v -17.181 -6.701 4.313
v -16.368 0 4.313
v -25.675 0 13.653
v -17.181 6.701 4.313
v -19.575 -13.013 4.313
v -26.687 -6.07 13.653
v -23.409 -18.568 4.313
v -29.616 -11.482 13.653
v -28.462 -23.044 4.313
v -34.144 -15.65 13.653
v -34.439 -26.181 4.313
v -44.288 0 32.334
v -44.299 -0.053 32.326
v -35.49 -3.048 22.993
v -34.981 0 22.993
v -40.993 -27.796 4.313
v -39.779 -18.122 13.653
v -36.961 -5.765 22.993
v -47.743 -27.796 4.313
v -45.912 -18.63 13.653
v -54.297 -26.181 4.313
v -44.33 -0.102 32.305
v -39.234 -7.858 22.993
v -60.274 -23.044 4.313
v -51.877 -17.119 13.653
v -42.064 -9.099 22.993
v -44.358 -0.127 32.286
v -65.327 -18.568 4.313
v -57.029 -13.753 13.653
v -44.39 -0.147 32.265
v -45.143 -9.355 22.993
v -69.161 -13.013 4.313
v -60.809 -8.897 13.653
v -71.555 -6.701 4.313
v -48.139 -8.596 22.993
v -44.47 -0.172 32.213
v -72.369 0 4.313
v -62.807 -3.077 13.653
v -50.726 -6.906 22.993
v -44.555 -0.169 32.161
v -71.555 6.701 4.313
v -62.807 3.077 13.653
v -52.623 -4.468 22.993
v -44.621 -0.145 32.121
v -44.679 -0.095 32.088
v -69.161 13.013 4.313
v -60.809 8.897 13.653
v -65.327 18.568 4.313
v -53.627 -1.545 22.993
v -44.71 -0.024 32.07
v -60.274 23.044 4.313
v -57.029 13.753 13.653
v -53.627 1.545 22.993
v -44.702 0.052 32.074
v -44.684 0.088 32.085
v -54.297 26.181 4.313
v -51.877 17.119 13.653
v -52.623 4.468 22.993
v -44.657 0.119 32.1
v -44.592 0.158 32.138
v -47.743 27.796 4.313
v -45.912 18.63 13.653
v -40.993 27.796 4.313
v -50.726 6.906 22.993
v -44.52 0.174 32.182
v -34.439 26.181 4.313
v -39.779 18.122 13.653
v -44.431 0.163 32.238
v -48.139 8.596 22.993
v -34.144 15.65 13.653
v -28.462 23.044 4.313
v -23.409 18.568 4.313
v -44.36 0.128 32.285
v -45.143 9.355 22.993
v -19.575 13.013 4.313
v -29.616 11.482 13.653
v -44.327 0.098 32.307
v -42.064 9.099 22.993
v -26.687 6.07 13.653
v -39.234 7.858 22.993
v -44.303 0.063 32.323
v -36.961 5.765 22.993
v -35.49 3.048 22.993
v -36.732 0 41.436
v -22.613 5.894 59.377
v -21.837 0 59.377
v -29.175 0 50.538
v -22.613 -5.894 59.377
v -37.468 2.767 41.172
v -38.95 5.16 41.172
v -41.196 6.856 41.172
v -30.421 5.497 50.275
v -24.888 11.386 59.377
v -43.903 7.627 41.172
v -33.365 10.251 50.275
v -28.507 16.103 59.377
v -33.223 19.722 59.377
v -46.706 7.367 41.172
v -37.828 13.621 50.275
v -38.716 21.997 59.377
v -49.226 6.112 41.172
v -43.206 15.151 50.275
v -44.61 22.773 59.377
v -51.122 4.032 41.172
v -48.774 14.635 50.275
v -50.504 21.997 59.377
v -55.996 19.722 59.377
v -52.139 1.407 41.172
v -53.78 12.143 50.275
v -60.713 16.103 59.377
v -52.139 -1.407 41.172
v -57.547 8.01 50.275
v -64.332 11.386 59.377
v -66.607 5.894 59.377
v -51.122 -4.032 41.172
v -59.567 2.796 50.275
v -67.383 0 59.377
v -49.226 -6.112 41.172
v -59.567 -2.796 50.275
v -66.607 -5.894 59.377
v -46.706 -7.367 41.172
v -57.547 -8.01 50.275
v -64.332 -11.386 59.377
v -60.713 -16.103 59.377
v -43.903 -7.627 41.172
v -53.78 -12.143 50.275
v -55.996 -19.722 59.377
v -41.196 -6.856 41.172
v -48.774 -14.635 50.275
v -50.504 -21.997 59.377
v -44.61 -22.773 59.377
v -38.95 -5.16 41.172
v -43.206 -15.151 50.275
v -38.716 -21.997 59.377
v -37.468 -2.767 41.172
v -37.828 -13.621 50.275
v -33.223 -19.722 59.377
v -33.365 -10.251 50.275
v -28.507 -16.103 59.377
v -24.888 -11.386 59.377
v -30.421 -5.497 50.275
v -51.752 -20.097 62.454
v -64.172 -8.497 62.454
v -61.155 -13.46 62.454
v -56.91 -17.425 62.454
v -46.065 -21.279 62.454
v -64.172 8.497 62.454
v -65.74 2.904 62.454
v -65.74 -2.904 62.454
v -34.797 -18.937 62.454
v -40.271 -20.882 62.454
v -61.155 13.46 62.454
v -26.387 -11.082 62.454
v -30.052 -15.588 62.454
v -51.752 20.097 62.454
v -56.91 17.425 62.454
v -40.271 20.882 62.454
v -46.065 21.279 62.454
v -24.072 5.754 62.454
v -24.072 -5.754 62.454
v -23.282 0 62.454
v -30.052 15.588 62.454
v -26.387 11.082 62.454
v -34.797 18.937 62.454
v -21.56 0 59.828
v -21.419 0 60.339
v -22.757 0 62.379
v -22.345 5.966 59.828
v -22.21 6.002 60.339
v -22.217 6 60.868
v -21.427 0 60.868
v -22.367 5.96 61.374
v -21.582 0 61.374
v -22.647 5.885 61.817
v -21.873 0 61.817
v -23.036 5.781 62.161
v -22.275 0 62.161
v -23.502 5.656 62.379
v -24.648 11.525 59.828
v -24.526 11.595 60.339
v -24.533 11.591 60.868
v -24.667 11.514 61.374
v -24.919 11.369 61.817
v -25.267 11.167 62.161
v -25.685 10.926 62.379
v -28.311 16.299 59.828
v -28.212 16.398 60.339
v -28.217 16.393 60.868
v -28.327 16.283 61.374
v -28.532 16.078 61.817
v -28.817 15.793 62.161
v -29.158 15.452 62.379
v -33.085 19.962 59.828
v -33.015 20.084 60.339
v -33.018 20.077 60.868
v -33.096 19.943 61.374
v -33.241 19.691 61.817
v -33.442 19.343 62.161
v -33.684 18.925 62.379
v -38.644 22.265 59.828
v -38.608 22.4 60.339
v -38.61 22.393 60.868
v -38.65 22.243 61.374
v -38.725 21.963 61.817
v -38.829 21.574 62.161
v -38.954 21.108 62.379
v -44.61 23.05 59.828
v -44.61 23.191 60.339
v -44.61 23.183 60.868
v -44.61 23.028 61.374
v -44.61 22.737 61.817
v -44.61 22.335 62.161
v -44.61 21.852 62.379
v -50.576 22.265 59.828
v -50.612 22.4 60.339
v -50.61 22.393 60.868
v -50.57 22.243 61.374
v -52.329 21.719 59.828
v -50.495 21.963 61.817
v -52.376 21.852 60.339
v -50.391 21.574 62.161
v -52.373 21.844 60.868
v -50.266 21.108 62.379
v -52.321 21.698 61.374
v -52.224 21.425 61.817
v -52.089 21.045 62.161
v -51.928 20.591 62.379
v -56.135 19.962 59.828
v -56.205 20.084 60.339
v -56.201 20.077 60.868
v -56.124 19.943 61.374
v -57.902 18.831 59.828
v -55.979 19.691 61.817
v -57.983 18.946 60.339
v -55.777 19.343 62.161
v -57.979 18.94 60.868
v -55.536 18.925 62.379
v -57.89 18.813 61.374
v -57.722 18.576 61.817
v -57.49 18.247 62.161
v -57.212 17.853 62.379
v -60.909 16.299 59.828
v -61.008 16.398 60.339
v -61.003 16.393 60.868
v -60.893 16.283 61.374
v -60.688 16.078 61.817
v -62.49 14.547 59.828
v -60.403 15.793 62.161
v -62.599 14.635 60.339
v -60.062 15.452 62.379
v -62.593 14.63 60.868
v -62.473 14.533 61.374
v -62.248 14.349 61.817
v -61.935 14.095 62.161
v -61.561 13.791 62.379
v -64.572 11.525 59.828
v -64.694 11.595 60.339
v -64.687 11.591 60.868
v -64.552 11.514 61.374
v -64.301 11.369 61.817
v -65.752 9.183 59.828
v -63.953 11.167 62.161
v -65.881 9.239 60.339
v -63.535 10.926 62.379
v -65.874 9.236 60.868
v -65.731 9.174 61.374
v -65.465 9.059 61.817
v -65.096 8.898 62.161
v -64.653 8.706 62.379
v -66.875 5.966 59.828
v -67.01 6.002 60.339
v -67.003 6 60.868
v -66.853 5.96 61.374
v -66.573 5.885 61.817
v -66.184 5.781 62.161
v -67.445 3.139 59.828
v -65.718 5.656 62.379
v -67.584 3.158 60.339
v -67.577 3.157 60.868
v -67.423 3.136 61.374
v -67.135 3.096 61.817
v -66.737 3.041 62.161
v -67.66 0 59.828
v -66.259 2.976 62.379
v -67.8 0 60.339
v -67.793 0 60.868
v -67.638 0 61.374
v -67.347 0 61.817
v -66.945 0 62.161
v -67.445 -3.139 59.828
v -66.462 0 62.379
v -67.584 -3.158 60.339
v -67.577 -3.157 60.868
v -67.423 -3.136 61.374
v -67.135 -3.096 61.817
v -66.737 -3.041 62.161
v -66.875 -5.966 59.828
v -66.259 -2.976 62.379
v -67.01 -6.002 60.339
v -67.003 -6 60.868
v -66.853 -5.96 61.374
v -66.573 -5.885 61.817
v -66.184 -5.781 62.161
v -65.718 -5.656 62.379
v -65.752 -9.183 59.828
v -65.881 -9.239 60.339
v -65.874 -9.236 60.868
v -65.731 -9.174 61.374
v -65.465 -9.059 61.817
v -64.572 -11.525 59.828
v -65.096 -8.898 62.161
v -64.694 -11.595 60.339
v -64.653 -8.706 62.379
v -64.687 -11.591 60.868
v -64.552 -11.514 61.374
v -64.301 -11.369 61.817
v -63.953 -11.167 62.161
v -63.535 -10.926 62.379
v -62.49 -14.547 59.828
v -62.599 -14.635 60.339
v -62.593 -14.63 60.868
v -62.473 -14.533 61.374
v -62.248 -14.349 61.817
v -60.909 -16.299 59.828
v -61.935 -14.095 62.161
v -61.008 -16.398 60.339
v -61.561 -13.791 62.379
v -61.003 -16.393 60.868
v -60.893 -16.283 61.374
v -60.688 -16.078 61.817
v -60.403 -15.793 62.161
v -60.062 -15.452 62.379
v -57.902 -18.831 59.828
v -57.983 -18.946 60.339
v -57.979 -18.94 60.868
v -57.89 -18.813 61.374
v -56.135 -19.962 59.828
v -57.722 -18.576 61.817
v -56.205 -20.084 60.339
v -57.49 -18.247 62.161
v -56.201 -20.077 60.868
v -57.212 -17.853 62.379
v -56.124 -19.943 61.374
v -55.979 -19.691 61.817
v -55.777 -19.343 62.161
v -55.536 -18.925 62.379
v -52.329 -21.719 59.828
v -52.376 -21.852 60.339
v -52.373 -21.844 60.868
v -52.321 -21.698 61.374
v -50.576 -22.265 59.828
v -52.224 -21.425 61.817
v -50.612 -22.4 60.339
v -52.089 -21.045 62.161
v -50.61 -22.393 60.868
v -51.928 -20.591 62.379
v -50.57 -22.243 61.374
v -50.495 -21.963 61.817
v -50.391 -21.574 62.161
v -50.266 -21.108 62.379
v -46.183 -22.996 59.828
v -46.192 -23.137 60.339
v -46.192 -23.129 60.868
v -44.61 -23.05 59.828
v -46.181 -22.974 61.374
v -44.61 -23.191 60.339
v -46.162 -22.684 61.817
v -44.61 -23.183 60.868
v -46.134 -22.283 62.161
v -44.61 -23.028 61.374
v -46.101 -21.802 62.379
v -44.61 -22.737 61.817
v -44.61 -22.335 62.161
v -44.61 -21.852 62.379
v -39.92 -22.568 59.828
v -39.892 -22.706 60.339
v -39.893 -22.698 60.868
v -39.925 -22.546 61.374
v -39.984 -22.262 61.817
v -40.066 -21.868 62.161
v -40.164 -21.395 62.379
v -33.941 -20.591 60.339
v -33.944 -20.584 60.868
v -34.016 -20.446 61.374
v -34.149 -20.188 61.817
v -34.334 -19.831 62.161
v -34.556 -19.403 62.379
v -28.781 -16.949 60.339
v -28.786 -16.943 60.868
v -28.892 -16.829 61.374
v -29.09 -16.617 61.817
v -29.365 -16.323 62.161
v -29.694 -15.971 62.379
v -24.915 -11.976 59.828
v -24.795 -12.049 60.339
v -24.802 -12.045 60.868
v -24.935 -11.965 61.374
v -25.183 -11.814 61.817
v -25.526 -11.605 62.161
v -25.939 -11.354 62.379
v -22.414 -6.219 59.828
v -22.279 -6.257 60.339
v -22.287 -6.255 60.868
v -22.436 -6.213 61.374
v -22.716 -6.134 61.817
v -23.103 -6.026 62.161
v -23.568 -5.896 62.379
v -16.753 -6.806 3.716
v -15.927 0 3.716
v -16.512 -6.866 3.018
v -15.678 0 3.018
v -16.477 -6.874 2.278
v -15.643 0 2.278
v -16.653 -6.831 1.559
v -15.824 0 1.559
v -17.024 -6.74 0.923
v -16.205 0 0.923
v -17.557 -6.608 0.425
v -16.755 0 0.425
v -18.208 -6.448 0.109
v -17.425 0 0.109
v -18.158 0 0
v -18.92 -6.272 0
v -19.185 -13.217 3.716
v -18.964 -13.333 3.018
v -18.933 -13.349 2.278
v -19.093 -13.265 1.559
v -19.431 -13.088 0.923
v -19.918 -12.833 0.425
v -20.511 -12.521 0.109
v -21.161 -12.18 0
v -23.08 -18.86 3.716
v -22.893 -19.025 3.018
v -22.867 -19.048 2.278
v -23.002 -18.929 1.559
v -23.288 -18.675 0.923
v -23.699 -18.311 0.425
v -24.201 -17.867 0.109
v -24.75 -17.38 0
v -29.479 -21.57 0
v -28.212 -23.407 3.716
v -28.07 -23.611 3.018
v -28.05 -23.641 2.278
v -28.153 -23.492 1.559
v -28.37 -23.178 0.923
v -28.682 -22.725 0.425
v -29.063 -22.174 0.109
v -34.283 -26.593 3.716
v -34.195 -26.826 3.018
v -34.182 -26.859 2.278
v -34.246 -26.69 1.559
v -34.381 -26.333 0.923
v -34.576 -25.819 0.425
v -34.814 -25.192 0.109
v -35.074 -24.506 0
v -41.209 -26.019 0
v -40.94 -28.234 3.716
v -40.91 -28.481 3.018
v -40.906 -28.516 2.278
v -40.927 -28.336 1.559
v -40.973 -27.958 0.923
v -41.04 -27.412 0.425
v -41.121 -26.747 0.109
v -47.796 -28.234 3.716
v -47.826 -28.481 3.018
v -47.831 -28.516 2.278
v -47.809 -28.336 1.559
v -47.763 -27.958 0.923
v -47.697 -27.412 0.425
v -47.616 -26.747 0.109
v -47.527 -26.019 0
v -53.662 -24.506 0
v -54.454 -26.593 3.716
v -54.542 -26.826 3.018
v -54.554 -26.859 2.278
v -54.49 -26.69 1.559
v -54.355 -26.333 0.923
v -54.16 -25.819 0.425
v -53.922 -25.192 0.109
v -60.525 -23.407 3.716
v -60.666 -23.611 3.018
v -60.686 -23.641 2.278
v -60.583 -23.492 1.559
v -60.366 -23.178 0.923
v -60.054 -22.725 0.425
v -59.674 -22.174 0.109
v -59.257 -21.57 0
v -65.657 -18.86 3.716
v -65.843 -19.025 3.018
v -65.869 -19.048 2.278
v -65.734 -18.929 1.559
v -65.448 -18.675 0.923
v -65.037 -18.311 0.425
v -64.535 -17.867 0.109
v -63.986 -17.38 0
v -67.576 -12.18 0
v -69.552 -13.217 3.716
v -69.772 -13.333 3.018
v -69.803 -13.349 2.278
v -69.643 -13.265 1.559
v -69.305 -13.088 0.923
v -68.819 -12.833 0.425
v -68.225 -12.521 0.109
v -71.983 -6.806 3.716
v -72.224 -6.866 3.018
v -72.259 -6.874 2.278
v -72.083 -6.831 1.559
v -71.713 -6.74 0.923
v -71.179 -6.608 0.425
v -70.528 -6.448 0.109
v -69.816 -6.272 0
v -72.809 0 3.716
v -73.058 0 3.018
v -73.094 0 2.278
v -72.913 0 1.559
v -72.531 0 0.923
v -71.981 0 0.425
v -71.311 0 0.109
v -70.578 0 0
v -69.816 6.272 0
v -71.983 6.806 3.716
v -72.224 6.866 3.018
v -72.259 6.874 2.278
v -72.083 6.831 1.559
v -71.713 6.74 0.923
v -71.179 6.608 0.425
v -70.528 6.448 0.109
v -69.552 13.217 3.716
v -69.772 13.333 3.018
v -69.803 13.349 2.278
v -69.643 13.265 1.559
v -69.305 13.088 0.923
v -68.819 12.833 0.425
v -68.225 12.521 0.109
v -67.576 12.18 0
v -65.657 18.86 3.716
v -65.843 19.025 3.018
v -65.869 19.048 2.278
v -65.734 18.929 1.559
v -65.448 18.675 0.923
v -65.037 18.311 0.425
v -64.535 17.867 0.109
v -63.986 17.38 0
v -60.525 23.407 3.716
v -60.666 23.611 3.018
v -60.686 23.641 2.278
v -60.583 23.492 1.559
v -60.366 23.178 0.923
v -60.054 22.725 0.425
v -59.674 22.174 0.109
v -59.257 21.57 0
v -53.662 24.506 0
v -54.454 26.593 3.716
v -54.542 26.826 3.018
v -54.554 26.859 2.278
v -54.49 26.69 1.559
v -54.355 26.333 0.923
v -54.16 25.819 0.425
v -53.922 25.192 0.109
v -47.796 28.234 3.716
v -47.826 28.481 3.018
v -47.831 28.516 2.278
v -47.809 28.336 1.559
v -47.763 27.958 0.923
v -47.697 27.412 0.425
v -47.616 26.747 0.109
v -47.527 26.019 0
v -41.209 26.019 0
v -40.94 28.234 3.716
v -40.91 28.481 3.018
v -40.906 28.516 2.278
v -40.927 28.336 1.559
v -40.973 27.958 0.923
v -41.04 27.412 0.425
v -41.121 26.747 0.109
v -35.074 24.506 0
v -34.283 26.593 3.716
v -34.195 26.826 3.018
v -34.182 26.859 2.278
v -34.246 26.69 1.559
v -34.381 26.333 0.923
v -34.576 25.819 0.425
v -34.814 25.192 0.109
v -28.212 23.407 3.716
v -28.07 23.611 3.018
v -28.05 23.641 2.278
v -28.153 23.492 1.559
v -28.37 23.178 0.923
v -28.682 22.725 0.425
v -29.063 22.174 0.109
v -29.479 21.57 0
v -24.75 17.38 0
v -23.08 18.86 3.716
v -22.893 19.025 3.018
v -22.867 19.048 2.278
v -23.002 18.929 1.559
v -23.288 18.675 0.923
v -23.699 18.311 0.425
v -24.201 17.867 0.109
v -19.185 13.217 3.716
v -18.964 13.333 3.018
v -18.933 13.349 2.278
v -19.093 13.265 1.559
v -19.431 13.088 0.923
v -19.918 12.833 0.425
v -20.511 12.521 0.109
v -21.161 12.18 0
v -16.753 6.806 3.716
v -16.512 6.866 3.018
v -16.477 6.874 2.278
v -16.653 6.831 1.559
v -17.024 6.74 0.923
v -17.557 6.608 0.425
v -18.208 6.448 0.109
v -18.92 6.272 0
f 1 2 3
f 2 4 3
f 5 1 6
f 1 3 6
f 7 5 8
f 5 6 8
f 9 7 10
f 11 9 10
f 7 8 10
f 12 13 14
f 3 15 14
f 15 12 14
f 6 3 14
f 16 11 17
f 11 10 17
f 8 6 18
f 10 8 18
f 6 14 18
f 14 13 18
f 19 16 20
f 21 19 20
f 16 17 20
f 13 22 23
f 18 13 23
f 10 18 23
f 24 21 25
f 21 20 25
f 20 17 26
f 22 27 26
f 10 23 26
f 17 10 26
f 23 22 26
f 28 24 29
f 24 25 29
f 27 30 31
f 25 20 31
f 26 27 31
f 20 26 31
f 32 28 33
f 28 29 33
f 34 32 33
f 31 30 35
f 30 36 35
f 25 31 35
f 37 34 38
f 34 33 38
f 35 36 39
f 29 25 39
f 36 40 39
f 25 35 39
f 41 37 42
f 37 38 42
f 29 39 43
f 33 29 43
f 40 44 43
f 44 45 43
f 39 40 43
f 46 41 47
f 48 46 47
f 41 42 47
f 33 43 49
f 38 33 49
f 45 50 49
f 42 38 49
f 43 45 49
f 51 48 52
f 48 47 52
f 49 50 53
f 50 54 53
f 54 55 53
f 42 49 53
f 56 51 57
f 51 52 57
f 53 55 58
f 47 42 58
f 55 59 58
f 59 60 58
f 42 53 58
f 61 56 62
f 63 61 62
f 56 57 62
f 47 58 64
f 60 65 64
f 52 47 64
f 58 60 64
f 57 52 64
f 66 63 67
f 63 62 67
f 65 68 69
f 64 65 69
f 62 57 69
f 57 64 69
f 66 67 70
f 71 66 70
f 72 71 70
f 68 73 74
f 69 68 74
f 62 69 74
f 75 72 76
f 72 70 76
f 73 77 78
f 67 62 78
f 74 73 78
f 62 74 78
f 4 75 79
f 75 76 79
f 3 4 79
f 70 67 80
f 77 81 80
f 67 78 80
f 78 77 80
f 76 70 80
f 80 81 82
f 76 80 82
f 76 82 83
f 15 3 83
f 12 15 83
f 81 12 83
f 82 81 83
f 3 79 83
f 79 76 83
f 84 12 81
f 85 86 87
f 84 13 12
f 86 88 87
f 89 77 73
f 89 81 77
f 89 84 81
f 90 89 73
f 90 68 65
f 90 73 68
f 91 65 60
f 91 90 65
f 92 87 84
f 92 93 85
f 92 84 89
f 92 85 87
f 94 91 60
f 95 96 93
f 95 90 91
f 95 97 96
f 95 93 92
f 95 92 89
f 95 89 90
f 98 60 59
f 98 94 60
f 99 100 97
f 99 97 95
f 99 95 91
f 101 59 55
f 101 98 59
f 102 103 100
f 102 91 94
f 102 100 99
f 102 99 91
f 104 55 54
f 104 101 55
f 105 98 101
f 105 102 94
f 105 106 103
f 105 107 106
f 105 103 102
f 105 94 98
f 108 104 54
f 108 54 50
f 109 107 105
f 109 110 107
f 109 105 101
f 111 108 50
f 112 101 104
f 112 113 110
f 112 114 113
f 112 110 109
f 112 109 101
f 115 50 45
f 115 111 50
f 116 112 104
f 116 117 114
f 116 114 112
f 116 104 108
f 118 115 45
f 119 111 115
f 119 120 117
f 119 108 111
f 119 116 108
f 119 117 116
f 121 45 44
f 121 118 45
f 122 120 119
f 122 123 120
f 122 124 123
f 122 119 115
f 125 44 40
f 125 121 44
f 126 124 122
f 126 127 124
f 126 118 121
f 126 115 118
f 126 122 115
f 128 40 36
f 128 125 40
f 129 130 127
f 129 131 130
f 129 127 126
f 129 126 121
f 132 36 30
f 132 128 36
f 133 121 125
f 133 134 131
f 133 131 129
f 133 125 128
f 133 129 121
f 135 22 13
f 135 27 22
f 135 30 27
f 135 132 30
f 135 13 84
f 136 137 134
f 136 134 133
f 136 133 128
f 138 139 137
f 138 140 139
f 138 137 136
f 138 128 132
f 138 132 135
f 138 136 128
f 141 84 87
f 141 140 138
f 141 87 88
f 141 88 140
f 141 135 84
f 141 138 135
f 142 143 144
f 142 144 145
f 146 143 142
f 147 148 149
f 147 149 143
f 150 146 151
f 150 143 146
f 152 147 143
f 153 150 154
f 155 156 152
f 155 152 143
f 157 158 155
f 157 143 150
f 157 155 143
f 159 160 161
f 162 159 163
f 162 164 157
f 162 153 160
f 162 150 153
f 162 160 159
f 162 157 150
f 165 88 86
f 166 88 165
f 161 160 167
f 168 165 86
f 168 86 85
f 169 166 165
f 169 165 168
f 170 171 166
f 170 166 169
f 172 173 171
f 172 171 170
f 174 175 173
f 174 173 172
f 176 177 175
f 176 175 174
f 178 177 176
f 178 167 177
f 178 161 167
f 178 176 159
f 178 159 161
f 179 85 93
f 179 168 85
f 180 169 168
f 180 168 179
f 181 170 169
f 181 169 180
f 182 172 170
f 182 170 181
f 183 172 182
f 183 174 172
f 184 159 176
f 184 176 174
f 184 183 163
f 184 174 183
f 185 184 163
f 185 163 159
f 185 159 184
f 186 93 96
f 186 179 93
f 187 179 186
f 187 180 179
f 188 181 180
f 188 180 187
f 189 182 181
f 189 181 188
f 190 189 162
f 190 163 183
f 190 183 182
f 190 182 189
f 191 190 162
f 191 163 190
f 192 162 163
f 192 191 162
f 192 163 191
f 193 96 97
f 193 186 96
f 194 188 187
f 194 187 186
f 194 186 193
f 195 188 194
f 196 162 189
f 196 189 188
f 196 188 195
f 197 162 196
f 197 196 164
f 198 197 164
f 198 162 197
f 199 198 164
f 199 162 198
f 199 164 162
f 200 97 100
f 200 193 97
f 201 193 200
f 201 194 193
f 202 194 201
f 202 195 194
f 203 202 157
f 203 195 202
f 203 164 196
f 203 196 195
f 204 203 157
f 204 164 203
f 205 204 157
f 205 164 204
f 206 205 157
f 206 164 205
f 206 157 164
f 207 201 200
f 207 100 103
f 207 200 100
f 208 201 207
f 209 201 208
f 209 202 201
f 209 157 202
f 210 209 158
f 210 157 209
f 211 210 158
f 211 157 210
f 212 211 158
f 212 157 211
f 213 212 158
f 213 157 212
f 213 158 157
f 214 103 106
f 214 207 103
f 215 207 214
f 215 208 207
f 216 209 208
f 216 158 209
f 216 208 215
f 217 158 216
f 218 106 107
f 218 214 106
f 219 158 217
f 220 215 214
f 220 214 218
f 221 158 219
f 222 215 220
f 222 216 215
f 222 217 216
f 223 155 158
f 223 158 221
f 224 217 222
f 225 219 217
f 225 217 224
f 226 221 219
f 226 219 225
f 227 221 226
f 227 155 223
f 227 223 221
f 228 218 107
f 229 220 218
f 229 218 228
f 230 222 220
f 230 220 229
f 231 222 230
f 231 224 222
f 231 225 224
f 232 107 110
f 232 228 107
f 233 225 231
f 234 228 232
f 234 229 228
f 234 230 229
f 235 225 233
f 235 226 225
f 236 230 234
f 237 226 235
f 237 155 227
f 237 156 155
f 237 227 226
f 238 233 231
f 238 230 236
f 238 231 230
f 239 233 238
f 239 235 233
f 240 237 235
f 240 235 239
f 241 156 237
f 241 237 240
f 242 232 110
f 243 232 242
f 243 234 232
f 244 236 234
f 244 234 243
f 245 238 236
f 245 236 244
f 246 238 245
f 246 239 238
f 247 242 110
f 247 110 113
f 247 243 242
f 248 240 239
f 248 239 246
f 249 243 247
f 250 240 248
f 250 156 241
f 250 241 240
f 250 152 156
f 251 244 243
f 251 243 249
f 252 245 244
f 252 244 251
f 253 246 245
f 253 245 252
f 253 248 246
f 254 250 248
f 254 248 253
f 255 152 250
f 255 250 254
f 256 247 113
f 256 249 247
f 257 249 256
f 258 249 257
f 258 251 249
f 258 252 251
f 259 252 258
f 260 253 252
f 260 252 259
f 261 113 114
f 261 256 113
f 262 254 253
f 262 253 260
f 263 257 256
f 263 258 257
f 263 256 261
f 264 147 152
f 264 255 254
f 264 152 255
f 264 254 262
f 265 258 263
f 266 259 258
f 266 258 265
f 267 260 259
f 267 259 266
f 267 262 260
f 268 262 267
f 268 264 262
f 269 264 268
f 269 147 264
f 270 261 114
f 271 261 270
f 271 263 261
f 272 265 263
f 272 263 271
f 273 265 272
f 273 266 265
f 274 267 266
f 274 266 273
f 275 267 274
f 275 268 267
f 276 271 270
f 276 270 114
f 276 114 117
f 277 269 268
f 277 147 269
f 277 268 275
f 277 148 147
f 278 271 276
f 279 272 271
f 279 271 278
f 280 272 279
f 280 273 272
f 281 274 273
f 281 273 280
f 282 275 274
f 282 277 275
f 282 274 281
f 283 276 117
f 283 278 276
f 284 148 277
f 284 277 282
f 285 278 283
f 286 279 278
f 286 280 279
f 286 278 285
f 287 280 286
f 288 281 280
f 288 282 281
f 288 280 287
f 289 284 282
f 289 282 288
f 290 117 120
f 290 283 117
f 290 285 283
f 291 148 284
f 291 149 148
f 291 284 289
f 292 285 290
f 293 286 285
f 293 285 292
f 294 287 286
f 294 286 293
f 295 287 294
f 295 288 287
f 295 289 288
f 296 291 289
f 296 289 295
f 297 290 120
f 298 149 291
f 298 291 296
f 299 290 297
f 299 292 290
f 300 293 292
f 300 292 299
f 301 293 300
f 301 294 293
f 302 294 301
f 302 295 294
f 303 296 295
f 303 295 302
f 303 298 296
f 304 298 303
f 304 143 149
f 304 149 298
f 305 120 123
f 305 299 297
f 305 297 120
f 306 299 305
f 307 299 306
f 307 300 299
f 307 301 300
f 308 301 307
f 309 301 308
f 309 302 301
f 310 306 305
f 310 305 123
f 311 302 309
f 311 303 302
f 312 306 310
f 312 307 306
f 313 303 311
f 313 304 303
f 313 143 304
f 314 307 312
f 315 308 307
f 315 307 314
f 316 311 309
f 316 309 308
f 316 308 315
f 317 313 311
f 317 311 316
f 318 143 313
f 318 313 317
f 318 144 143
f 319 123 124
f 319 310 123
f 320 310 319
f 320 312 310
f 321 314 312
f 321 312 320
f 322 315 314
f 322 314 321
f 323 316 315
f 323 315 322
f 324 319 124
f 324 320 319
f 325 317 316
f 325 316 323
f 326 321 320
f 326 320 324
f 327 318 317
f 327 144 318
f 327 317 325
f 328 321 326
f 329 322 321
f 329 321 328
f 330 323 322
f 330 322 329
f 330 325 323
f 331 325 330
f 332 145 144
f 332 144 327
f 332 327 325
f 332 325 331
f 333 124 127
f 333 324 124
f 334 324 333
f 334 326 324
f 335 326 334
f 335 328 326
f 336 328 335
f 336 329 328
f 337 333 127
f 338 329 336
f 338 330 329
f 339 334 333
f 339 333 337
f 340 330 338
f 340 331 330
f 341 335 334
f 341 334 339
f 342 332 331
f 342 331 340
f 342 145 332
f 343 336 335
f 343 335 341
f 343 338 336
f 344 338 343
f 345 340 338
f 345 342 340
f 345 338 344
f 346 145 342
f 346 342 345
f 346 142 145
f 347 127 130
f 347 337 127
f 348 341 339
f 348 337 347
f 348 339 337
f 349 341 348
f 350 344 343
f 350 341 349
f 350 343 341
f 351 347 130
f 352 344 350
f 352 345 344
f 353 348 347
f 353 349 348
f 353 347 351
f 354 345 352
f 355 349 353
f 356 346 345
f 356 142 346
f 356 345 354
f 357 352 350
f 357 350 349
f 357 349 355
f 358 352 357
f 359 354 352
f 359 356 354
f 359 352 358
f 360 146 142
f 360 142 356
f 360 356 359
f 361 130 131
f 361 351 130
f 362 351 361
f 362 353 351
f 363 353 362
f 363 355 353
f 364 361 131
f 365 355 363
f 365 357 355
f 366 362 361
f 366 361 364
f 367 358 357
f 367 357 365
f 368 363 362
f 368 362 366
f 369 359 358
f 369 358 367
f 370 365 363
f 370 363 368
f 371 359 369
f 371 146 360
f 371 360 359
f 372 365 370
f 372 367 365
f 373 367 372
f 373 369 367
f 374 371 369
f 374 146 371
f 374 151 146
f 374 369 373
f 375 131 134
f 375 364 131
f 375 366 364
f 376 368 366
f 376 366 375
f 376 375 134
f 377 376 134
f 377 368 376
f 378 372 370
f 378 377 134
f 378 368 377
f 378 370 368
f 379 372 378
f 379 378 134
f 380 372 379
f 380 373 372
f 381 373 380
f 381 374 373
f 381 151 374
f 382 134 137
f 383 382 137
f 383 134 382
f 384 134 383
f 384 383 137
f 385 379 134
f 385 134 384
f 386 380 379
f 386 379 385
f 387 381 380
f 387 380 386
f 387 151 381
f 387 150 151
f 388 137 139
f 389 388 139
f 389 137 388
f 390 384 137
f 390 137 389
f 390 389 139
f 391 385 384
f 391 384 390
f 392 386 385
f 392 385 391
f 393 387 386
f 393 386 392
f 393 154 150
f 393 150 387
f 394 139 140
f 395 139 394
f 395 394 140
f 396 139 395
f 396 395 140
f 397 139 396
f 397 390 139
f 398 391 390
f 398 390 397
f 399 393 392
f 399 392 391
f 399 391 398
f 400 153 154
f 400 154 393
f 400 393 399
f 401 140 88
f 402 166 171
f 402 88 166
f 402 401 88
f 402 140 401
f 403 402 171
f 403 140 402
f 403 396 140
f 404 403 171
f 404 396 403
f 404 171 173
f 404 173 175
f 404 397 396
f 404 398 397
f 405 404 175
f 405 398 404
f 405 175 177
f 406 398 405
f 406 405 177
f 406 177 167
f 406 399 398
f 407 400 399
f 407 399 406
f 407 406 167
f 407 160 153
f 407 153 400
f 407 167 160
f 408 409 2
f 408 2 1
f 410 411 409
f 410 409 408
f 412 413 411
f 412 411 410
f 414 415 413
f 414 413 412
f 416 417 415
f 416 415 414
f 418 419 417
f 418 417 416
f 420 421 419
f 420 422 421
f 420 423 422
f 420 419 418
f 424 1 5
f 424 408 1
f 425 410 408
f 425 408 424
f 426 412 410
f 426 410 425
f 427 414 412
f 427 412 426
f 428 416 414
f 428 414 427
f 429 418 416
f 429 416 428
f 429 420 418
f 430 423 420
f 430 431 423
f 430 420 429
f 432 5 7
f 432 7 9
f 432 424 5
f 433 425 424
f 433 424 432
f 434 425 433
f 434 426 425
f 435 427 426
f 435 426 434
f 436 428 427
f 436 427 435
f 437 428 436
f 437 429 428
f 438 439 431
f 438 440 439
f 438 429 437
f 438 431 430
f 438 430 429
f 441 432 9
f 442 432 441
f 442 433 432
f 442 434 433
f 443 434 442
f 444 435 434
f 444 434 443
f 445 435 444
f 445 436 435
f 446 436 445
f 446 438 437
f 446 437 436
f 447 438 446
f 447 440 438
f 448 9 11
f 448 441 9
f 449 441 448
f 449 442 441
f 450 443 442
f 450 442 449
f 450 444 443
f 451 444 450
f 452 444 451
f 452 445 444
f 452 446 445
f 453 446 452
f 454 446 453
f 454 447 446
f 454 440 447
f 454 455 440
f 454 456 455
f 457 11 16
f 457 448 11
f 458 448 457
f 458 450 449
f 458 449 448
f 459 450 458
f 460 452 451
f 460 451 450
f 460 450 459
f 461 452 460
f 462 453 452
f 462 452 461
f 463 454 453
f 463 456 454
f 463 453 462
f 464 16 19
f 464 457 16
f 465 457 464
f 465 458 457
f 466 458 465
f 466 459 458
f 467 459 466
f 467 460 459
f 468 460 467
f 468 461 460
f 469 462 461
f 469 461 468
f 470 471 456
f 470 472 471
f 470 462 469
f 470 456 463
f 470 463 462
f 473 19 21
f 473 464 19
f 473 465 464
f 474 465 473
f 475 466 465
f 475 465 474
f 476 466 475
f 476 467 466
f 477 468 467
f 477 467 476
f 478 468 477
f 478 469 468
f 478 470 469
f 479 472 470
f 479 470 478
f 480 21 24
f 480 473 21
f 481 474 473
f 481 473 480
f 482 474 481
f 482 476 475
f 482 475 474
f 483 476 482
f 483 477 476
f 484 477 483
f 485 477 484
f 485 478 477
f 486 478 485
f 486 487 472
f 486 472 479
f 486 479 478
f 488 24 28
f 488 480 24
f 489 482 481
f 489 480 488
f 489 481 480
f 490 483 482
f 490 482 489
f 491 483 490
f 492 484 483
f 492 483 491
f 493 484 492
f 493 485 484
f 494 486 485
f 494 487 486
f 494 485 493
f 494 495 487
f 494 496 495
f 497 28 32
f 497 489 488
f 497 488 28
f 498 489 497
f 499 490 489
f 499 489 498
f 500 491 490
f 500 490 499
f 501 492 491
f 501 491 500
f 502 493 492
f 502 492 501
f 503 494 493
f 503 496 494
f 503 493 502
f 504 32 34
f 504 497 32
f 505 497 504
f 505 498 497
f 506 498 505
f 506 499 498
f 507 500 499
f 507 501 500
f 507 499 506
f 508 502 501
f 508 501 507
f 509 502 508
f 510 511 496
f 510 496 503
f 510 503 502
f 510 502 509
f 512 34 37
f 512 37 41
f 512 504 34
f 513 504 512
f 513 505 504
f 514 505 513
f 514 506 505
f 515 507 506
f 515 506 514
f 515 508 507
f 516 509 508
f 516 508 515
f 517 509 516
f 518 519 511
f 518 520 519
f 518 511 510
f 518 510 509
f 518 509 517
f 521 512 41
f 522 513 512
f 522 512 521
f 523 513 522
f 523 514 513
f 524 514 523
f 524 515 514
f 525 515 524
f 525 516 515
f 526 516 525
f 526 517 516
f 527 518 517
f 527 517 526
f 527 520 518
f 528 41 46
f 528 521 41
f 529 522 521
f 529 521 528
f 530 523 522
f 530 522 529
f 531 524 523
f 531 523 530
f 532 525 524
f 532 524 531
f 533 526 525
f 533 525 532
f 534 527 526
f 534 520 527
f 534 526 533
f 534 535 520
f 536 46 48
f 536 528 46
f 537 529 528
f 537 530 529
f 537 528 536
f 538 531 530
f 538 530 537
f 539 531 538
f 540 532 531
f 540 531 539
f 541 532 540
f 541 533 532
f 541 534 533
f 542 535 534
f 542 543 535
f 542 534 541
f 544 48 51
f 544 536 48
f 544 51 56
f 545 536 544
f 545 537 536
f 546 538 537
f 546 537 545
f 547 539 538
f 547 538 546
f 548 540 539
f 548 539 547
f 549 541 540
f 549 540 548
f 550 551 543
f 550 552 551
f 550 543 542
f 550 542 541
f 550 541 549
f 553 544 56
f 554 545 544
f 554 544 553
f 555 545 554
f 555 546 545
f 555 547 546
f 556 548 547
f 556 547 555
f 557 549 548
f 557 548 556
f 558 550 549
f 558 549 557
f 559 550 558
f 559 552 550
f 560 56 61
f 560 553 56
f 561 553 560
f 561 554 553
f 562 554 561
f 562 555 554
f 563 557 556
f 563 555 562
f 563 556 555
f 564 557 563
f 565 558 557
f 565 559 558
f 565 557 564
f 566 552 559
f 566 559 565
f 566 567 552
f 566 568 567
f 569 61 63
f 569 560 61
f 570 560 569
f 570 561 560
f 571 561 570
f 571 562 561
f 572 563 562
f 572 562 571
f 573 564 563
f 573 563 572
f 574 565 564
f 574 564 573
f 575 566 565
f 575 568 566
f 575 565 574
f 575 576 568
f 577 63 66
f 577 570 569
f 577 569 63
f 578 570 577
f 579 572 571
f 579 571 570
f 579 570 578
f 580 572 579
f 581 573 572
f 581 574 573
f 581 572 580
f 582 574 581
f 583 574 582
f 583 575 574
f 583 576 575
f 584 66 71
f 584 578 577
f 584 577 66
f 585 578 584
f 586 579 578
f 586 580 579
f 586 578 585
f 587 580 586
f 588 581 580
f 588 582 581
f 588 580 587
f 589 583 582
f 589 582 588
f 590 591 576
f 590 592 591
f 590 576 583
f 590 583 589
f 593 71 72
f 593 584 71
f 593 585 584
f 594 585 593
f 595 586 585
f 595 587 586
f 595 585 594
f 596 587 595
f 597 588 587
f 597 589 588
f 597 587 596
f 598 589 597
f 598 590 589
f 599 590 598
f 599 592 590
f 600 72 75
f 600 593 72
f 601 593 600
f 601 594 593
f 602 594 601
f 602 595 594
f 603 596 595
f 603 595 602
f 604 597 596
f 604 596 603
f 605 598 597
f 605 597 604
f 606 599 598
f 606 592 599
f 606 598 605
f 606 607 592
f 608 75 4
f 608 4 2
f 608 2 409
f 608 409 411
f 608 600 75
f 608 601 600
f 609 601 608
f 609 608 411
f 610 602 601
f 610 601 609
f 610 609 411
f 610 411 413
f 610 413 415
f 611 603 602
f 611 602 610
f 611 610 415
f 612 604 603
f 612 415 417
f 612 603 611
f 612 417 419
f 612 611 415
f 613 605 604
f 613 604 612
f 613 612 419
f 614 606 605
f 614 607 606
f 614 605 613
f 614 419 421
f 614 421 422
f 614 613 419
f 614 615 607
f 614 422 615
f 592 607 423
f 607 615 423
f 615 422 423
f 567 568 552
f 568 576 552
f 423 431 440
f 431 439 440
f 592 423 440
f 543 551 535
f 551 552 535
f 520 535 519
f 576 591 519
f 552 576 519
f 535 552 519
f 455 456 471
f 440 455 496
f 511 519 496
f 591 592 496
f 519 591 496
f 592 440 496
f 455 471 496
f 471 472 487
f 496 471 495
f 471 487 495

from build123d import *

# Parameters (mm, degrees)
F2_R = 2.5281634783
F5_R = 1.8773668217


with BuildPart() as f1:
    # F0 (on Front) → F1 (revolve)
    with BuildSketch(Plane.XZ):
        Polygon((-12.0703522116, 0), (-44.3681403995, 32.4136614799), (-44.3681403995, 0), align=None)
    revolve(axis=Axis((-44.3681403995, 0, 16.20683074), (0, 0, -1)))

    # F2
    f2_edges = [f1.edges().sort_by_distance(p)[0] for p in [
        (-76.665929, 0, 0),
        (-28.219246, 0, 16.206831),
    ]]
    fillet(f2_edges, radius=F2_R)

    # F3 (on Front) → F4 (revolve)
    with BuildSketch(Plane.XZ):
        Polygon((-44.6098931134, 62.4538473785), (-44.6098931134, 31.946439296), (-19.2829854786, 62.4538473785), align=None)
    revolve(axis=Axis((-44.6098931134, 0, 47.2001433372), (0, 0, 1)))

    # F5
    f5_edges = [f1.edges().sort_by_distance(p)[0] for p in [
        (-69.936801, 0, 62.453847),
    ]]
    fillet(f5_edges, radius=F5_R)


solid = f1.part
